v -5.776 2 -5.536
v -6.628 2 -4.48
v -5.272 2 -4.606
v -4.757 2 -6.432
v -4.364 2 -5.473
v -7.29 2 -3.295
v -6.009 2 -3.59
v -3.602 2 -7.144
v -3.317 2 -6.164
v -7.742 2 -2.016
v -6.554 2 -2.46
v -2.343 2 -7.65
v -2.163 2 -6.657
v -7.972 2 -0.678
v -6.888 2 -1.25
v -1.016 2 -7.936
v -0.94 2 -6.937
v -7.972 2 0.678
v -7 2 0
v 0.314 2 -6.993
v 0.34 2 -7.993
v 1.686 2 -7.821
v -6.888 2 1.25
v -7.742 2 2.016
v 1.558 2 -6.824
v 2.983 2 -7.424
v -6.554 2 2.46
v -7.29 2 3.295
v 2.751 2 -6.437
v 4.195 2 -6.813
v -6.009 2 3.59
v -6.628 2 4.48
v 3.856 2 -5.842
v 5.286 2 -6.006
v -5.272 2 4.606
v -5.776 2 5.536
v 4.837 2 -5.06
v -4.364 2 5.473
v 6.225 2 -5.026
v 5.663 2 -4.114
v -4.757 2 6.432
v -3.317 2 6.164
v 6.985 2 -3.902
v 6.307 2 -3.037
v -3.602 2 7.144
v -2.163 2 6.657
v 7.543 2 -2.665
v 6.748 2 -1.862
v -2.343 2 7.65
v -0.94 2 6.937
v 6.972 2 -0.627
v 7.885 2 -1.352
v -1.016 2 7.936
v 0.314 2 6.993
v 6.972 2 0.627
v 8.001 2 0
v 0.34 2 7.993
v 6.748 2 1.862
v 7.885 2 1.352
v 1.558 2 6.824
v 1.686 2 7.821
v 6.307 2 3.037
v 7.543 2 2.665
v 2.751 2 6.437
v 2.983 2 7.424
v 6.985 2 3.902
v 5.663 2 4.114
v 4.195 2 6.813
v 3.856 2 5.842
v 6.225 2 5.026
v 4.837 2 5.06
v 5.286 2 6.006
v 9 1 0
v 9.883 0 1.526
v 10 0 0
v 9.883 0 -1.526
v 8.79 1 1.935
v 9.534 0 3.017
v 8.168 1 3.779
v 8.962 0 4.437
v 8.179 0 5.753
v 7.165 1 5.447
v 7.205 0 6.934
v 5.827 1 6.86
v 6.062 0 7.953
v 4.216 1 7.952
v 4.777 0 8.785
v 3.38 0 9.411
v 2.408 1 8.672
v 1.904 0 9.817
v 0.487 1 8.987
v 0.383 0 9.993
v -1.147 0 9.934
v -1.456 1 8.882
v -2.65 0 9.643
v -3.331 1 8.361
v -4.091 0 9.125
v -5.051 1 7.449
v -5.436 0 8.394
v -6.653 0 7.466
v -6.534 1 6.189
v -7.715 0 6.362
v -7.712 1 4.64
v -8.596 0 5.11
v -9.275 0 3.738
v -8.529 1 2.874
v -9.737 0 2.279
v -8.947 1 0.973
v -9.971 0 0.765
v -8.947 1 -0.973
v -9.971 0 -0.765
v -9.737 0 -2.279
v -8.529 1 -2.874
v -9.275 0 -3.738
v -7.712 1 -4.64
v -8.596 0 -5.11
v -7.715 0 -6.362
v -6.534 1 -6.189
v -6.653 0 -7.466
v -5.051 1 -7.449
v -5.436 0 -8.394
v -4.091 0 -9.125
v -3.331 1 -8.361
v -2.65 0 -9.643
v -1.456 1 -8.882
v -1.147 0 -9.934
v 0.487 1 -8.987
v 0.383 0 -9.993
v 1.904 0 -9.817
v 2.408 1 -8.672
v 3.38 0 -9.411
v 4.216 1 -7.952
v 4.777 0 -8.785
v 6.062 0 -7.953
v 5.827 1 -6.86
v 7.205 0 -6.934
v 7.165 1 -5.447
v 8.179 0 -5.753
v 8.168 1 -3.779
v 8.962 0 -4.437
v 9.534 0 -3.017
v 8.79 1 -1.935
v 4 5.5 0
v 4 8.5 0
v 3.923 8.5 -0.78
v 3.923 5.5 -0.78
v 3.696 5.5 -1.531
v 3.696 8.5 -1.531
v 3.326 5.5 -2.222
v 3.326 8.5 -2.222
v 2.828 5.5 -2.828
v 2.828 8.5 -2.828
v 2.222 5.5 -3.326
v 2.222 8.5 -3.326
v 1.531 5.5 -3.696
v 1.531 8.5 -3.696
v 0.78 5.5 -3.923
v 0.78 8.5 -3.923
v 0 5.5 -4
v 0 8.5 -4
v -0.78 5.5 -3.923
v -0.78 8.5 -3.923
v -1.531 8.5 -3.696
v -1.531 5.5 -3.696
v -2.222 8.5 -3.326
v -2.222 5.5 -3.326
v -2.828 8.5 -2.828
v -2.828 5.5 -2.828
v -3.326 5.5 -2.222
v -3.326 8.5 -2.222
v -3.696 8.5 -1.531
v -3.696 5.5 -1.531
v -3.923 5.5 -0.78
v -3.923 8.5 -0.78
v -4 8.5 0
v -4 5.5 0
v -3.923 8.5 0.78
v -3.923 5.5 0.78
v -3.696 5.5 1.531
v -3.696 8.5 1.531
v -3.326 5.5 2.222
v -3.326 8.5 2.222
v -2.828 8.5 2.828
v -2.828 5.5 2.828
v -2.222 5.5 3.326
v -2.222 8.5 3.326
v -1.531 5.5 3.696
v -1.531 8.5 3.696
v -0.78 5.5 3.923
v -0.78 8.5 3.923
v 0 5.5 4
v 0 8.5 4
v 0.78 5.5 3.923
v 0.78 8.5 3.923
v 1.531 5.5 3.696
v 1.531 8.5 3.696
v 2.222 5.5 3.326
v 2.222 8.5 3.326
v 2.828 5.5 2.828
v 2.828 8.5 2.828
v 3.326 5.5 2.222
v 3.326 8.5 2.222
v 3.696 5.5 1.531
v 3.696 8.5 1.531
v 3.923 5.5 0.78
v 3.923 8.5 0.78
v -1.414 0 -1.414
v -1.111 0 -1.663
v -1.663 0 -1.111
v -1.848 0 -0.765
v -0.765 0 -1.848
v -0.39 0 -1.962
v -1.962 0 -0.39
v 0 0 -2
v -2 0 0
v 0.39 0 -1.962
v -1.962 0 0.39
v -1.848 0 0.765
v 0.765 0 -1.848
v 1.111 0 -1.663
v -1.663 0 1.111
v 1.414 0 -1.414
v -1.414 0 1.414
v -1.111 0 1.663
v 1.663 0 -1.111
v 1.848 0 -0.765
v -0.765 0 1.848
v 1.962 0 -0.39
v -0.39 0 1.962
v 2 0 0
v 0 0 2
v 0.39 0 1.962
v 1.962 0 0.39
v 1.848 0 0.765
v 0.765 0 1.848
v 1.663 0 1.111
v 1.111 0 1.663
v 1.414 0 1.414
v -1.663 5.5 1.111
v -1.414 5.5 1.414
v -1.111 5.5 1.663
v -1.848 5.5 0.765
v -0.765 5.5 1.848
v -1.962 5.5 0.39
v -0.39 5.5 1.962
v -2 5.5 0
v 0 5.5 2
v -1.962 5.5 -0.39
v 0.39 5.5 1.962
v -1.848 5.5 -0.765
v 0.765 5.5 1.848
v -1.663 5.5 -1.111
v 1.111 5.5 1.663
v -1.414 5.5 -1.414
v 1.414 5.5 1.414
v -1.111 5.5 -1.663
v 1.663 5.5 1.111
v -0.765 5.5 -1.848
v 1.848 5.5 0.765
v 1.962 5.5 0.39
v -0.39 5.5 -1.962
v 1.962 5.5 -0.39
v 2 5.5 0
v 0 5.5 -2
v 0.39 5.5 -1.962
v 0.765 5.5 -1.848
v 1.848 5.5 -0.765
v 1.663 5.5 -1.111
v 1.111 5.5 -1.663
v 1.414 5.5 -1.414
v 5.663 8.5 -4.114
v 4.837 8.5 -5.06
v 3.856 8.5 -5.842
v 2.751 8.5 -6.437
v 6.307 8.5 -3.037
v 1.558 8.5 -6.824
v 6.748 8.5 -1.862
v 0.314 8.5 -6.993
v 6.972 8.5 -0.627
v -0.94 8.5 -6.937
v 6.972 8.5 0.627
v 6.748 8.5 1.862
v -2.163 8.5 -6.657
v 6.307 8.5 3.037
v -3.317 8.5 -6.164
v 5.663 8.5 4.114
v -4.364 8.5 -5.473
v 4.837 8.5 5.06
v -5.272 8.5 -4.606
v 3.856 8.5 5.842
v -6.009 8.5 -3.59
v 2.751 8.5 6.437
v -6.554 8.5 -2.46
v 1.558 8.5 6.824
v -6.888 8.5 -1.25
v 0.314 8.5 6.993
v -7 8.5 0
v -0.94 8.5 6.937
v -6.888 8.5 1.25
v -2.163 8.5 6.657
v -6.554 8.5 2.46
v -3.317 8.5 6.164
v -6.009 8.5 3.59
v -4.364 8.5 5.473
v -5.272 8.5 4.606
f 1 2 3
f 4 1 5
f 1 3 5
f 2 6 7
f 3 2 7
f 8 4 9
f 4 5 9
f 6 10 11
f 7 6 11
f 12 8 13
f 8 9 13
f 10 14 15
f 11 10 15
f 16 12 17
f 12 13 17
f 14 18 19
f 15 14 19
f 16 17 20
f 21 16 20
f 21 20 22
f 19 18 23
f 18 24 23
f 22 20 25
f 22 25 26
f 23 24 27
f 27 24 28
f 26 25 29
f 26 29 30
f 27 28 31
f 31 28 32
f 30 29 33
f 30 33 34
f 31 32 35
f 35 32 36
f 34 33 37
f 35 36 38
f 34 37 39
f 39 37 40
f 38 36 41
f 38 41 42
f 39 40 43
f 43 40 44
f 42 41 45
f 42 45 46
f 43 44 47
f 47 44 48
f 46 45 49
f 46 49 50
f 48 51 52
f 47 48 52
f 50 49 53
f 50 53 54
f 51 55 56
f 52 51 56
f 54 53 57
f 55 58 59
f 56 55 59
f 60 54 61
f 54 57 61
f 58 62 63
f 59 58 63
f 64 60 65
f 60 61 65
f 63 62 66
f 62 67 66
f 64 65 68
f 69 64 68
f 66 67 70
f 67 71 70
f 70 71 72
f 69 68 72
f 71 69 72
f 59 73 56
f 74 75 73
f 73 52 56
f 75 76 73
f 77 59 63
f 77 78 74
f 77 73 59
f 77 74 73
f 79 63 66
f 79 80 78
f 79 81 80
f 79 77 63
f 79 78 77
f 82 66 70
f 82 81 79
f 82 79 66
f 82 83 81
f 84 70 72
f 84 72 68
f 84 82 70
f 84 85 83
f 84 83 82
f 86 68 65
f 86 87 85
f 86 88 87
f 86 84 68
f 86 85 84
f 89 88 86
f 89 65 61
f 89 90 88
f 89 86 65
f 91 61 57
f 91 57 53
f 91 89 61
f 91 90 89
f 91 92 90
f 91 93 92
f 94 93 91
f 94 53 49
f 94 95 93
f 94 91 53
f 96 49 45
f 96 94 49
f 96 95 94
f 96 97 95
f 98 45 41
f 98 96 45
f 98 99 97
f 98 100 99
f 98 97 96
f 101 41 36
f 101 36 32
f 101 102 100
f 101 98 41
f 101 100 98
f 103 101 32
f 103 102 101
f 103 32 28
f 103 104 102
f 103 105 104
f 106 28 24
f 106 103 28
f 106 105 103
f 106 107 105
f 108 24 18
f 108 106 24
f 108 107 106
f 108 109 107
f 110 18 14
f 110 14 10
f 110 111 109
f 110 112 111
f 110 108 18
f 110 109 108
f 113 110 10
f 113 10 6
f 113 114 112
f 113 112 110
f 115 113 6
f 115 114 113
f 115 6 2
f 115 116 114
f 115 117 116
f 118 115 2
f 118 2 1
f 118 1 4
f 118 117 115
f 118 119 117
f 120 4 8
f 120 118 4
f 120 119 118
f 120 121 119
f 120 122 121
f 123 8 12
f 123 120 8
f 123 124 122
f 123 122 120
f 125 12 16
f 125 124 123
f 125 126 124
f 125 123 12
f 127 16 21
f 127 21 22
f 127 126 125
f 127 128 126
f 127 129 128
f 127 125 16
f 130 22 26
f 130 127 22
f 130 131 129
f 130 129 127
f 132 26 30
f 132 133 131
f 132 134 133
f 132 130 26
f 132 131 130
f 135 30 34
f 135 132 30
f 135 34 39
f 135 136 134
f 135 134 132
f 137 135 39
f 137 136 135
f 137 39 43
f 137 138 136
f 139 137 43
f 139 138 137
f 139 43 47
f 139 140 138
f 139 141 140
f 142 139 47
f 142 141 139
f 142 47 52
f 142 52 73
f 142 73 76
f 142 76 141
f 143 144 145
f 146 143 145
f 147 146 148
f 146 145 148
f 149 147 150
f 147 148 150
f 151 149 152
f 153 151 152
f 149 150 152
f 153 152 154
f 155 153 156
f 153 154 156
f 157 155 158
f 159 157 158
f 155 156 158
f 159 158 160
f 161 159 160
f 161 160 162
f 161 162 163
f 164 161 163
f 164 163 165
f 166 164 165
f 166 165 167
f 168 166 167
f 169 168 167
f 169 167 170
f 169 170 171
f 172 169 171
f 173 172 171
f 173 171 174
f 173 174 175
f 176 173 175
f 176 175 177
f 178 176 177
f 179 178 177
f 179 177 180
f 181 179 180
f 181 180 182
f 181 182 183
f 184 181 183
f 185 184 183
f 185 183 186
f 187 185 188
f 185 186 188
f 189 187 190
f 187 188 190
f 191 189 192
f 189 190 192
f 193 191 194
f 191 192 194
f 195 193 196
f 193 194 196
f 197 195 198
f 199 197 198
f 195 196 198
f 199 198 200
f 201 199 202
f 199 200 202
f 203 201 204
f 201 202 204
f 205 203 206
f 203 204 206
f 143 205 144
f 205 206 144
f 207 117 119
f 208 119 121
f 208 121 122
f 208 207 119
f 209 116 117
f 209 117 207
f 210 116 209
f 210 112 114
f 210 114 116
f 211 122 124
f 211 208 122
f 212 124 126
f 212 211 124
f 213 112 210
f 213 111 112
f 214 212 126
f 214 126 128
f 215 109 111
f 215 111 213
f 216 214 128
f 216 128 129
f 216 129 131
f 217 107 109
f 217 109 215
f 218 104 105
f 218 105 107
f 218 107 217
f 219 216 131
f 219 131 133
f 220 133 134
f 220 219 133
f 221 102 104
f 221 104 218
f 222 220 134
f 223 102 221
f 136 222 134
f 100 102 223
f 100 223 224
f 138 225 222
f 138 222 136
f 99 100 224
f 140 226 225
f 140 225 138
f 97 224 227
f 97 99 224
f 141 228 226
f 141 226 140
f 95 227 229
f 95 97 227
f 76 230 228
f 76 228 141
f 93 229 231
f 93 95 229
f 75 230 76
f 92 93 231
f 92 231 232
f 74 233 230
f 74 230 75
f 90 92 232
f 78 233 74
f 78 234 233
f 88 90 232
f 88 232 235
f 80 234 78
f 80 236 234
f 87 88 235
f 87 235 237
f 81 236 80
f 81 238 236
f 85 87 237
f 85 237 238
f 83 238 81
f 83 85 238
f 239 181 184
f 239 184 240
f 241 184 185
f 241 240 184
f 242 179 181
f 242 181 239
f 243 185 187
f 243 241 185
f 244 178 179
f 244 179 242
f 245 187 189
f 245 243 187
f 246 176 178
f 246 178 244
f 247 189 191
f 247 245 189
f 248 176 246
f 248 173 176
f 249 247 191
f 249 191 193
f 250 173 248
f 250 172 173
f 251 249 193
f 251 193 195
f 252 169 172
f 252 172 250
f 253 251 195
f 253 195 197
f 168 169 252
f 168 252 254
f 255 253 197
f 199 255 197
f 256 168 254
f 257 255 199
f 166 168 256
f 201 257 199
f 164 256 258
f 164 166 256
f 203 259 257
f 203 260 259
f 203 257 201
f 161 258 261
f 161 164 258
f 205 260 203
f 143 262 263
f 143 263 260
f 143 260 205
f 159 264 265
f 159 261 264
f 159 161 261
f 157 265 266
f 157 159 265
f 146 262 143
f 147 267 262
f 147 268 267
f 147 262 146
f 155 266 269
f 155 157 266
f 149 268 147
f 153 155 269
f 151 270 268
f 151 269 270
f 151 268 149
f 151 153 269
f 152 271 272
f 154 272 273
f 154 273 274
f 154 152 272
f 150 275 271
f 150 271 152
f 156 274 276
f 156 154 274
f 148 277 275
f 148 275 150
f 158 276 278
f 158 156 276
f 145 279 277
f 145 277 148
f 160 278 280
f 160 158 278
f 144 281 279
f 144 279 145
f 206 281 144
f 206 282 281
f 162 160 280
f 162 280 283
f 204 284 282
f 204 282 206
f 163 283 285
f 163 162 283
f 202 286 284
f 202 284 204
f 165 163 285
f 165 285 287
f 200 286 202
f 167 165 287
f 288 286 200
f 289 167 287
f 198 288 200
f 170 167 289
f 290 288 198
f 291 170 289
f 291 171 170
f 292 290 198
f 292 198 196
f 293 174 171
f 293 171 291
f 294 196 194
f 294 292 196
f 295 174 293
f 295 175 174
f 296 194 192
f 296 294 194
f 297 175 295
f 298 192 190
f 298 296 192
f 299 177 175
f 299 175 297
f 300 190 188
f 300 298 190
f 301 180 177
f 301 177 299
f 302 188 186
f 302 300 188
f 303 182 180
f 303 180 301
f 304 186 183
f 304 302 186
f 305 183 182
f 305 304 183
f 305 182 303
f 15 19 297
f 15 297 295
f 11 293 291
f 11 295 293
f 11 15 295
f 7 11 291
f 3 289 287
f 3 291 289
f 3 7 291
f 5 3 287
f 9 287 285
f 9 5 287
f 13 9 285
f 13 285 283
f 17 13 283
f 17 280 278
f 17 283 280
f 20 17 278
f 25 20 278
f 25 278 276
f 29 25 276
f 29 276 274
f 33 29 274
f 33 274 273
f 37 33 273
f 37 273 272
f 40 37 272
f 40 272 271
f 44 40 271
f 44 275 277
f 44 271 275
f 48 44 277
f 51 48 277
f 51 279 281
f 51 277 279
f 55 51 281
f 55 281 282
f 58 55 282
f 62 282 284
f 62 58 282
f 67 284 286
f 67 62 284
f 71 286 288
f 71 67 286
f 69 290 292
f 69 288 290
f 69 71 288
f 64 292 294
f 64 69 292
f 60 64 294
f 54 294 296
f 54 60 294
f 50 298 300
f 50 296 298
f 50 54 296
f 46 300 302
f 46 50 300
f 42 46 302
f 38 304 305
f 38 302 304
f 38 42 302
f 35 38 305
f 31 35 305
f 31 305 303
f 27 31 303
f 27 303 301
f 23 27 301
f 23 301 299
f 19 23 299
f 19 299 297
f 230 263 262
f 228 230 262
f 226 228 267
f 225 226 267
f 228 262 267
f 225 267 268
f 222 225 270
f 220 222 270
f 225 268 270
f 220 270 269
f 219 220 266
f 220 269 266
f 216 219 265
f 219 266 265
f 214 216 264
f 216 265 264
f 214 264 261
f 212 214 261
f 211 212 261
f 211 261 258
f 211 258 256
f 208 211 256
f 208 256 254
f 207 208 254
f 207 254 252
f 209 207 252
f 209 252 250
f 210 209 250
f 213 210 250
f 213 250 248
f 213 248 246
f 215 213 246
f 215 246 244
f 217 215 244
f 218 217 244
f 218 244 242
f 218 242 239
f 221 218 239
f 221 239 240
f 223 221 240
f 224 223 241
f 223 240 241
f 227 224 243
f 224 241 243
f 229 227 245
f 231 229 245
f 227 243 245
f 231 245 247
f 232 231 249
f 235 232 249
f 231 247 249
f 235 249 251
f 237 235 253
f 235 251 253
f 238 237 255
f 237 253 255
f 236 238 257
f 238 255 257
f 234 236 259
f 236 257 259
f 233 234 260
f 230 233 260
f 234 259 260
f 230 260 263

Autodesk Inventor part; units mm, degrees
ref_plane "YZ Plane" through (0, 0, 0) normal (1, 0, 0) x (0, 1, 0)
ref_plane "XZ Plane" through (0, 0, 0) normal (0, 1, 0) x (-1, 0, 0)
ref_plane "XY Plane" through (0, 0, 0) normal (0, 0, 1) x (1, 0, 0)
sketch "Sketch1" plane through (0, 0, 0) normal (0, 1, 0) x (-1, 0, 0)
  circle A0 centre (0, 0) radius 7
  dimension "d0" = 14
extrude "Extrusion1" add sketch "Sketch1" along normal blind 8.5
sketch "Sketch2" plane through (0, 8.5, 0) normal (0, 1, 0) x (1, 0, 0)
  circle A0 centre (0, 0) radius 4
  dimension "d3" = 8
extrude "Extrusion2" cut sketch "Sketch2" against normal blind 3
sketch "Sketch3" plane through (0, 5.5, 0) normal (0, 1, 0) x (1, 0, 0)
  circle A0 centre (0, 0) radius 2
  dimension "d6" = 4
extrude "Extrusion3" cut sketch "Sketch3" against normal through all
sketch "Sketch4" plane through (0, 0, 0) normal (0, -1, 0) x (1, 0, 0)
  circle A0 centre (0, 0) radius 2 projected
  circle A1 centre (0, 0) radius 10
  circle A2 centre (0, 0) radius 7
  dimension "d9" = 20
extrude "Extrusion4" add sketch "Sketch4" against normal blind 2 contours A1
chamfer "Chamfer1" distance 2 angle 45 1 edges at (-10, 2, 0)
properties part number "spacer_long"
